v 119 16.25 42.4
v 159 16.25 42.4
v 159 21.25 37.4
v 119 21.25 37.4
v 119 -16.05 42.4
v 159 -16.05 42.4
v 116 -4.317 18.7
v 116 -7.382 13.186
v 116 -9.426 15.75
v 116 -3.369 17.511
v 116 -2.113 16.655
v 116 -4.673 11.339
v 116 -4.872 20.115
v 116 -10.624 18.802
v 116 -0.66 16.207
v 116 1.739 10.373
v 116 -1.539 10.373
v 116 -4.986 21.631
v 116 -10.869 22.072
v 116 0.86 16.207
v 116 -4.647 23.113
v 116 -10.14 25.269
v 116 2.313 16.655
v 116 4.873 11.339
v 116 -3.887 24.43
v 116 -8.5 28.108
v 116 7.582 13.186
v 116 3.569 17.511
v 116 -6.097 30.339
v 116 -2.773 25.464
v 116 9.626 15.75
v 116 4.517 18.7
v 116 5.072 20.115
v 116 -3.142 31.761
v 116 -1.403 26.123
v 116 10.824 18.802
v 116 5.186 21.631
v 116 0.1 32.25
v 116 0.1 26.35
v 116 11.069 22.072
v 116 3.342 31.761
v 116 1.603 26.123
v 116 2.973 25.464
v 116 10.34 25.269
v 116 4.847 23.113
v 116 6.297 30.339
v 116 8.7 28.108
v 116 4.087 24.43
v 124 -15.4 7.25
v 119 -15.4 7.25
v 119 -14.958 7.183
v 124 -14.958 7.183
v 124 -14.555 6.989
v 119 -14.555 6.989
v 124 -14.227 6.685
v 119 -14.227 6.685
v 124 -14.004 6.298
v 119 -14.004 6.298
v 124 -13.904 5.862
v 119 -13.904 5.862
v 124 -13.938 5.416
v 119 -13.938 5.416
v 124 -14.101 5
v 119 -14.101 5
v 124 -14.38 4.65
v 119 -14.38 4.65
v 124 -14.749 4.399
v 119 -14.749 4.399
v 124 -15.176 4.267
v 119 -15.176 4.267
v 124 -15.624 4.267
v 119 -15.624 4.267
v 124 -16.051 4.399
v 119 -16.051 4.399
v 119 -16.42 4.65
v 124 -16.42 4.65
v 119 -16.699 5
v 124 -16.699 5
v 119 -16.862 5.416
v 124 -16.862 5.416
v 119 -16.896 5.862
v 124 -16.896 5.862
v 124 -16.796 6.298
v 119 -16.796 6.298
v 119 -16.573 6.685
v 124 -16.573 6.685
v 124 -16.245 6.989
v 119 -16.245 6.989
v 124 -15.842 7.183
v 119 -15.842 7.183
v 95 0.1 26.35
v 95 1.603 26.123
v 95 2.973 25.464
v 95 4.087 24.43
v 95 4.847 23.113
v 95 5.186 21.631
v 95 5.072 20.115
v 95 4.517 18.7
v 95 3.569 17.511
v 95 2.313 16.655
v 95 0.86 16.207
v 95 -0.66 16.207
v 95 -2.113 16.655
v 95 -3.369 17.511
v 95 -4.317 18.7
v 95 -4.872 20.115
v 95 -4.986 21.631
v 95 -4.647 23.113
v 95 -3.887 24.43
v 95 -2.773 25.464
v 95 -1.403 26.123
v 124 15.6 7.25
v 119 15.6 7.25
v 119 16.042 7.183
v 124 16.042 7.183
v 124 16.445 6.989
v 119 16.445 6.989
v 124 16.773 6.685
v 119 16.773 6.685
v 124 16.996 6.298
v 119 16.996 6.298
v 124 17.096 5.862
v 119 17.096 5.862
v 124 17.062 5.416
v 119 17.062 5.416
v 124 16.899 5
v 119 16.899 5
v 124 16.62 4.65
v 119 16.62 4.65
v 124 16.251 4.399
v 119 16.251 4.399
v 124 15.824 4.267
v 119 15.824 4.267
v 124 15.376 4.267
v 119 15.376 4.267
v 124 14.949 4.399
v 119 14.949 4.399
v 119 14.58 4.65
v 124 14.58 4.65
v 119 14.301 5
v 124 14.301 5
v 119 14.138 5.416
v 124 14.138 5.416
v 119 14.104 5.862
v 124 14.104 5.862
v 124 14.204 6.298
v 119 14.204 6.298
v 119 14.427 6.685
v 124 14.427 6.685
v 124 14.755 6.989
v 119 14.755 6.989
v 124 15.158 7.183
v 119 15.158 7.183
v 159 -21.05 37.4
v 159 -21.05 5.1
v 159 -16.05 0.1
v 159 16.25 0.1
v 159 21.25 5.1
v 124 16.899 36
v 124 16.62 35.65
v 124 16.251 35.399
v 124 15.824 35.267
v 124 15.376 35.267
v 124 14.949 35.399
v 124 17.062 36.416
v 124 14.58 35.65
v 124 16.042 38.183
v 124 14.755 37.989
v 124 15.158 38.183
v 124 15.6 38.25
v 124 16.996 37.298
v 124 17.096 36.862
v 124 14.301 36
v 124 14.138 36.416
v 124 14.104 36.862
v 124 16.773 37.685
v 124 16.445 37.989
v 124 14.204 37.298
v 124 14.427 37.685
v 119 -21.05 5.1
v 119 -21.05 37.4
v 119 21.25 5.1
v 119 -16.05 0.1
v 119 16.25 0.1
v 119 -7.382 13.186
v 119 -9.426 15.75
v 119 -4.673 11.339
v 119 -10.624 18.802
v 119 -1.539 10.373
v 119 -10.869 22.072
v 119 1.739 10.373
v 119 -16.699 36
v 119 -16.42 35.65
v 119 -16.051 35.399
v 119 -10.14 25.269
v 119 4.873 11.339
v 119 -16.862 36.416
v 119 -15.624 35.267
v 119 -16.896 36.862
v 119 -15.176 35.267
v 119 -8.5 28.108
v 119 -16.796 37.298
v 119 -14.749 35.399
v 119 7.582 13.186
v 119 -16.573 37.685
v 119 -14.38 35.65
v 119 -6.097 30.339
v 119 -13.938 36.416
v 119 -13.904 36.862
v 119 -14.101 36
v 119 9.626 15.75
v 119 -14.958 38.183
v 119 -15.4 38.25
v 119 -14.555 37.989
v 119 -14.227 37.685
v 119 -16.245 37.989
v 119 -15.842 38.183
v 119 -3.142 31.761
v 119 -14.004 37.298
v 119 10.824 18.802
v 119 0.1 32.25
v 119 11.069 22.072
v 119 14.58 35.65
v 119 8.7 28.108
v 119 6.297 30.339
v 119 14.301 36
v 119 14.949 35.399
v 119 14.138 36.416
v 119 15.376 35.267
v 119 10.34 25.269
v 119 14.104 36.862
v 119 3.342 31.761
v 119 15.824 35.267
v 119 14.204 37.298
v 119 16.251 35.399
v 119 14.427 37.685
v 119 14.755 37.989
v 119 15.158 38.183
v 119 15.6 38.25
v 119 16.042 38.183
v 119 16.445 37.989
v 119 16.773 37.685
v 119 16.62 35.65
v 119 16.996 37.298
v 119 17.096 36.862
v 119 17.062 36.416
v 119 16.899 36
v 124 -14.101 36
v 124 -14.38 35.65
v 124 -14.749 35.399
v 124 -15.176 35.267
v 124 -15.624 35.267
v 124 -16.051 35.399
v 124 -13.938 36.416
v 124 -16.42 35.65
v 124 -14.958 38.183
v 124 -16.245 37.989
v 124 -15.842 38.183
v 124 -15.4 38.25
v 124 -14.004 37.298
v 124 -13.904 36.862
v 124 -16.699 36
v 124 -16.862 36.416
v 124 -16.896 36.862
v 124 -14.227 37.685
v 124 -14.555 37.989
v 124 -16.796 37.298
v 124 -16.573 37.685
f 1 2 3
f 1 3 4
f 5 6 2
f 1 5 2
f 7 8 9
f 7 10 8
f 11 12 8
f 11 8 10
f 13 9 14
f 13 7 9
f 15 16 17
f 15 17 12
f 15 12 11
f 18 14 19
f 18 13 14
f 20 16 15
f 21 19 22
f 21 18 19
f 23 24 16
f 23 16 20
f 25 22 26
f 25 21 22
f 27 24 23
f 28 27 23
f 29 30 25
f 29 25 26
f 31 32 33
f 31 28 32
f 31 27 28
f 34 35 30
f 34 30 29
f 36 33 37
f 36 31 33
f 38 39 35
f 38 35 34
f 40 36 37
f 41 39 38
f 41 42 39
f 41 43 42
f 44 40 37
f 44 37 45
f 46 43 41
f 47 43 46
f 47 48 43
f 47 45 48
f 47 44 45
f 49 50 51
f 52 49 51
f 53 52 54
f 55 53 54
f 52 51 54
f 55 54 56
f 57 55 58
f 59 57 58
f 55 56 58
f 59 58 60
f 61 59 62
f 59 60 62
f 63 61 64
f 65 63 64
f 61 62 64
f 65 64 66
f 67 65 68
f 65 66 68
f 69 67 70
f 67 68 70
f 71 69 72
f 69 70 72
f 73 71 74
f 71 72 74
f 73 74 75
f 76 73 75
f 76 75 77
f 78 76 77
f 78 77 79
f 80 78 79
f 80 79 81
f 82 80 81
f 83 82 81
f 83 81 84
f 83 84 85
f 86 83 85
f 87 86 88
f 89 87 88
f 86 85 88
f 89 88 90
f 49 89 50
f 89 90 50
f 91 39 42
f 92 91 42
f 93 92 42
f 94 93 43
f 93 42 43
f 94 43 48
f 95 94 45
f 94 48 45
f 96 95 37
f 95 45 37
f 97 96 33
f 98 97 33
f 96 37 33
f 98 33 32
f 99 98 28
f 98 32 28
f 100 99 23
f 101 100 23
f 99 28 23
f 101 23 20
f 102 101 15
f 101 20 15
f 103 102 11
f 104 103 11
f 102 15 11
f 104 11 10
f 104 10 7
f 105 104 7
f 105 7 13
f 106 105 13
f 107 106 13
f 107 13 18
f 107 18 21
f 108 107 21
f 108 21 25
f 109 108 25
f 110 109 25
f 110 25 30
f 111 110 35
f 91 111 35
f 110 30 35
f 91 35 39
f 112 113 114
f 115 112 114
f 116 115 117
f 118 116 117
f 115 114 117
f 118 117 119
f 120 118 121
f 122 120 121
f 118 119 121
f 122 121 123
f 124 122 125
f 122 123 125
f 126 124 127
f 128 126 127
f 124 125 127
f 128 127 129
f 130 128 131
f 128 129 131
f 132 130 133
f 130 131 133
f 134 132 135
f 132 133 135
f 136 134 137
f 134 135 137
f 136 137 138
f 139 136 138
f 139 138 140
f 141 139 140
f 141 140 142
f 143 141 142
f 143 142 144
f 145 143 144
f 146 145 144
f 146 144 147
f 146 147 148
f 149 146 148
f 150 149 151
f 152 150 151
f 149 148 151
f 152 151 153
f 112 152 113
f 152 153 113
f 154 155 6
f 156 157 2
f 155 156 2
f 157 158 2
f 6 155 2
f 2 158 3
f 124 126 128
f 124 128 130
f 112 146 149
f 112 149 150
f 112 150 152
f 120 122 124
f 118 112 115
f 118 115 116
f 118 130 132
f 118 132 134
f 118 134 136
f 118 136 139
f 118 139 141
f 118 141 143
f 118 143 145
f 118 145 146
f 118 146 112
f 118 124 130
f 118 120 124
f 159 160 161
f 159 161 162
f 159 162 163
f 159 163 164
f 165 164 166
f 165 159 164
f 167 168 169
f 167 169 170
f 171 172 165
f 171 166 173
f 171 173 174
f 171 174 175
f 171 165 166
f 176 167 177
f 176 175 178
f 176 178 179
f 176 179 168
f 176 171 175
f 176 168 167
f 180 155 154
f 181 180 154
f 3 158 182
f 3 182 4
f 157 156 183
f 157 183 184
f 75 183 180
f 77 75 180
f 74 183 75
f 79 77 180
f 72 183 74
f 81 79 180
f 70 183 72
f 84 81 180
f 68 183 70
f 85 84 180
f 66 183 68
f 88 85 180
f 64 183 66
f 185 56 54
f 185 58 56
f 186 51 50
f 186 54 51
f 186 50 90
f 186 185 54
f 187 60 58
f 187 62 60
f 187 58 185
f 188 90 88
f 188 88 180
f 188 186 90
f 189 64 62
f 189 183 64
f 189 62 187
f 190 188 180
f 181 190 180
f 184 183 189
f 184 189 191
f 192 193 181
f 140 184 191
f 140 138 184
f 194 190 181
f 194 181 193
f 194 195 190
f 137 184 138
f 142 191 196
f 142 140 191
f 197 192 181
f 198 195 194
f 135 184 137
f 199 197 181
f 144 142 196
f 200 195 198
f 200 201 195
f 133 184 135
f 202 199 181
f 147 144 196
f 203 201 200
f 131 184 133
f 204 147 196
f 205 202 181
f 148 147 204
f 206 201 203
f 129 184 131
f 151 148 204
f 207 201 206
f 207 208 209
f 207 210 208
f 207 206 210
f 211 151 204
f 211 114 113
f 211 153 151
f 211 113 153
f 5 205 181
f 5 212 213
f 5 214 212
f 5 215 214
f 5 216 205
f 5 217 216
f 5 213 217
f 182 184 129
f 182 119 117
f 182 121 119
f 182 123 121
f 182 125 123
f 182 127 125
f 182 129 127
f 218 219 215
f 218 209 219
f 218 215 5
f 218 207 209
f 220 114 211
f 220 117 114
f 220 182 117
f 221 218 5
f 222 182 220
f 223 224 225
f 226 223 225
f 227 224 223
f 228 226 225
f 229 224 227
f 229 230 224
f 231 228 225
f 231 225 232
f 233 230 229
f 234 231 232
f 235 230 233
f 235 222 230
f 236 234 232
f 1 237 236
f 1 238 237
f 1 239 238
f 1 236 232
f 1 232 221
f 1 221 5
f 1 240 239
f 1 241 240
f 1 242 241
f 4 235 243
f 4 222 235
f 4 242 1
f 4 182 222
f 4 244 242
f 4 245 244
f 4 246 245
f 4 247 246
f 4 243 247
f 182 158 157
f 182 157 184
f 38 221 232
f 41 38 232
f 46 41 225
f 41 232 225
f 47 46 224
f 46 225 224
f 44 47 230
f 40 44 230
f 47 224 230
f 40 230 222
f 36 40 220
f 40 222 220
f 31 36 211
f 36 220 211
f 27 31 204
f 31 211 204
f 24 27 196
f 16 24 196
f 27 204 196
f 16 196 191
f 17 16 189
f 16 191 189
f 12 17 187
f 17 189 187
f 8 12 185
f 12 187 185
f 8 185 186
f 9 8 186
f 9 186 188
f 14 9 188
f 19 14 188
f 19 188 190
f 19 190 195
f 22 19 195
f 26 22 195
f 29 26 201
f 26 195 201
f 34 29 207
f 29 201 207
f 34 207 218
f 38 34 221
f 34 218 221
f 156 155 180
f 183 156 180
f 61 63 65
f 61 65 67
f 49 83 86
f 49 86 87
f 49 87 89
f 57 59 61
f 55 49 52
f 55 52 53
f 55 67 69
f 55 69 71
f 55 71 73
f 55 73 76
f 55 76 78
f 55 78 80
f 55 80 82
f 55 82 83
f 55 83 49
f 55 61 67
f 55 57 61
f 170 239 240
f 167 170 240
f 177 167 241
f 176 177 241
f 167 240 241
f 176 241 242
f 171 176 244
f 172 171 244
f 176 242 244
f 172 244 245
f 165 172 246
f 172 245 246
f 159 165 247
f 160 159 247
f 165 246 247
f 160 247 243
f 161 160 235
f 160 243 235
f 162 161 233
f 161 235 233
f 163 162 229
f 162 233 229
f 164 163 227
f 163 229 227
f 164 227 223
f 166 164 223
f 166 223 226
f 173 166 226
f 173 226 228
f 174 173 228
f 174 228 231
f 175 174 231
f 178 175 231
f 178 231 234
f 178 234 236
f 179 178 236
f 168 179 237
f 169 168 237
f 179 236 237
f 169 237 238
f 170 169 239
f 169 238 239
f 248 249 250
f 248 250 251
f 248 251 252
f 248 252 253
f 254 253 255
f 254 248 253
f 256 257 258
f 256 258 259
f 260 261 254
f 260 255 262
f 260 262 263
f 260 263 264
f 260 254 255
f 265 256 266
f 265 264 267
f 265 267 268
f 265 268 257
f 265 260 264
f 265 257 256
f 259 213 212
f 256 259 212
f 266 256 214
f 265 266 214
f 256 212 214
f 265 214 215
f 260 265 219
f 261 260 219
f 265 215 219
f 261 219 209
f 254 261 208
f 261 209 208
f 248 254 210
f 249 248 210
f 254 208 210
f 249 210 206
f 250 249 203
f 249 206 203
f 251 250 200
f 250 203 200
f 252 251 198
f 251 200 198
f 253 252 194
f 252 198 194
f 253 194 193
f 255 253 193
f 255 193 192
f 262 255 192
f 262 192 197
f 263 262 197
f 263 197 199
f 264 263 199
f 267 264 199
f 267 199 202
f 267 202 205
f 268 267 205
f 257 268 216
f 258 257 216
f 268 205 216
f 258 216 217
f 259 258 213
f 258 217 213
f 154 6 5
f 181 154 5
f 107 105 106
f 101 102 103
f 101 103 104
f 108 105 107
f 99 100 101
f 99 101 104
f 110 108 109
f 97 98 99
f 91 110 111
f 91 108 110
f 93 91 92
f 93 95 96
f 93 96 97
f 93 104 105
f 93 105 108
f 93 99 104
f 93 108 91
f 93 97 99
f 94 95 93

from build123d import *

# Parameters (mm, degrees)
SKETCH026_W             = 42.3
SKETCH026_H             = 42.3
PAD008_DEPTH            = 40
SKETCH025_R             = 11
PAD009_DEPTH            = 3
SKETCH023_R             = 5.1
PAD010_DEPTH            = 21
SKETCH027_R             = 1.5
POCKET012_DEPTH         = 5
CHAMFER002_SIZE         = 5
BODY007_PLACEMENT_ANGLE = 90


with BuildPart() as part:
    # Sketch026 → Pad008 (new body)
    with BuildSketch(Plane.XY):
        Rectangle(SKETCH026_W, SKETCH026_H)
    extrude(amount=PAD008_DEPTH)

    # Sketch025 (on Face6 of Pad008) → Pad009 (join)
    with BuildSketch(Plane.XY.offset(40)):
        Circle(SKETCH025_R)
    extrude(amount=PAD009_DEPTH)

    # Sketch023 (on Face8 of Pad009) → Pad010 (join)
    with BuildSketch(Plane.XY.offset(43)):
        Circle(SKETCH023_R)
    extrude(amount=PAD010_DEPTH)

    # Sketch027 (on Face5 of Pad010) → Pocket012 (cut)
    with BuildSketch(Plane.XY.offset(40)):
        with Locations((-15.5, 15.5)):
            Circle(SKETCH027_R)
        with Locations((15.5, 15.5)):
            Circle(SKETCH027_R)
        with Locations((15.5, -15.5)):
            Circle(SKETCH027_R)
        with Locations((-15.5, -15.5)):
            Circle(SKETCH027_R)
    extrude(amount=-POCKET012_DEPTH, mode=Mode.SUBTRACT)

    # Chamfer002
    chamfer002_edges = [part.edges().sort_by_distance(p)[0] for p in [
        (21.15, 21.15, 20),
        (21.15, -21.15, 20),
        (-21.15, 21.15, 20),
        (-21.15, -21.15, 20),
    ]]
    chamfer(chamfer002_edges, length=CHAMFER002_SIZE)


with BuildPart() as part_1:
    # Body007 placement: moved
    add(part.part.moved(Location((159, 0.1, 21.25))).rotate(Axis((159, 0.1, 21.25), (0, -1, 0)), BODY007_PLACEMENT_ANGLE))


solid = part_1.part
